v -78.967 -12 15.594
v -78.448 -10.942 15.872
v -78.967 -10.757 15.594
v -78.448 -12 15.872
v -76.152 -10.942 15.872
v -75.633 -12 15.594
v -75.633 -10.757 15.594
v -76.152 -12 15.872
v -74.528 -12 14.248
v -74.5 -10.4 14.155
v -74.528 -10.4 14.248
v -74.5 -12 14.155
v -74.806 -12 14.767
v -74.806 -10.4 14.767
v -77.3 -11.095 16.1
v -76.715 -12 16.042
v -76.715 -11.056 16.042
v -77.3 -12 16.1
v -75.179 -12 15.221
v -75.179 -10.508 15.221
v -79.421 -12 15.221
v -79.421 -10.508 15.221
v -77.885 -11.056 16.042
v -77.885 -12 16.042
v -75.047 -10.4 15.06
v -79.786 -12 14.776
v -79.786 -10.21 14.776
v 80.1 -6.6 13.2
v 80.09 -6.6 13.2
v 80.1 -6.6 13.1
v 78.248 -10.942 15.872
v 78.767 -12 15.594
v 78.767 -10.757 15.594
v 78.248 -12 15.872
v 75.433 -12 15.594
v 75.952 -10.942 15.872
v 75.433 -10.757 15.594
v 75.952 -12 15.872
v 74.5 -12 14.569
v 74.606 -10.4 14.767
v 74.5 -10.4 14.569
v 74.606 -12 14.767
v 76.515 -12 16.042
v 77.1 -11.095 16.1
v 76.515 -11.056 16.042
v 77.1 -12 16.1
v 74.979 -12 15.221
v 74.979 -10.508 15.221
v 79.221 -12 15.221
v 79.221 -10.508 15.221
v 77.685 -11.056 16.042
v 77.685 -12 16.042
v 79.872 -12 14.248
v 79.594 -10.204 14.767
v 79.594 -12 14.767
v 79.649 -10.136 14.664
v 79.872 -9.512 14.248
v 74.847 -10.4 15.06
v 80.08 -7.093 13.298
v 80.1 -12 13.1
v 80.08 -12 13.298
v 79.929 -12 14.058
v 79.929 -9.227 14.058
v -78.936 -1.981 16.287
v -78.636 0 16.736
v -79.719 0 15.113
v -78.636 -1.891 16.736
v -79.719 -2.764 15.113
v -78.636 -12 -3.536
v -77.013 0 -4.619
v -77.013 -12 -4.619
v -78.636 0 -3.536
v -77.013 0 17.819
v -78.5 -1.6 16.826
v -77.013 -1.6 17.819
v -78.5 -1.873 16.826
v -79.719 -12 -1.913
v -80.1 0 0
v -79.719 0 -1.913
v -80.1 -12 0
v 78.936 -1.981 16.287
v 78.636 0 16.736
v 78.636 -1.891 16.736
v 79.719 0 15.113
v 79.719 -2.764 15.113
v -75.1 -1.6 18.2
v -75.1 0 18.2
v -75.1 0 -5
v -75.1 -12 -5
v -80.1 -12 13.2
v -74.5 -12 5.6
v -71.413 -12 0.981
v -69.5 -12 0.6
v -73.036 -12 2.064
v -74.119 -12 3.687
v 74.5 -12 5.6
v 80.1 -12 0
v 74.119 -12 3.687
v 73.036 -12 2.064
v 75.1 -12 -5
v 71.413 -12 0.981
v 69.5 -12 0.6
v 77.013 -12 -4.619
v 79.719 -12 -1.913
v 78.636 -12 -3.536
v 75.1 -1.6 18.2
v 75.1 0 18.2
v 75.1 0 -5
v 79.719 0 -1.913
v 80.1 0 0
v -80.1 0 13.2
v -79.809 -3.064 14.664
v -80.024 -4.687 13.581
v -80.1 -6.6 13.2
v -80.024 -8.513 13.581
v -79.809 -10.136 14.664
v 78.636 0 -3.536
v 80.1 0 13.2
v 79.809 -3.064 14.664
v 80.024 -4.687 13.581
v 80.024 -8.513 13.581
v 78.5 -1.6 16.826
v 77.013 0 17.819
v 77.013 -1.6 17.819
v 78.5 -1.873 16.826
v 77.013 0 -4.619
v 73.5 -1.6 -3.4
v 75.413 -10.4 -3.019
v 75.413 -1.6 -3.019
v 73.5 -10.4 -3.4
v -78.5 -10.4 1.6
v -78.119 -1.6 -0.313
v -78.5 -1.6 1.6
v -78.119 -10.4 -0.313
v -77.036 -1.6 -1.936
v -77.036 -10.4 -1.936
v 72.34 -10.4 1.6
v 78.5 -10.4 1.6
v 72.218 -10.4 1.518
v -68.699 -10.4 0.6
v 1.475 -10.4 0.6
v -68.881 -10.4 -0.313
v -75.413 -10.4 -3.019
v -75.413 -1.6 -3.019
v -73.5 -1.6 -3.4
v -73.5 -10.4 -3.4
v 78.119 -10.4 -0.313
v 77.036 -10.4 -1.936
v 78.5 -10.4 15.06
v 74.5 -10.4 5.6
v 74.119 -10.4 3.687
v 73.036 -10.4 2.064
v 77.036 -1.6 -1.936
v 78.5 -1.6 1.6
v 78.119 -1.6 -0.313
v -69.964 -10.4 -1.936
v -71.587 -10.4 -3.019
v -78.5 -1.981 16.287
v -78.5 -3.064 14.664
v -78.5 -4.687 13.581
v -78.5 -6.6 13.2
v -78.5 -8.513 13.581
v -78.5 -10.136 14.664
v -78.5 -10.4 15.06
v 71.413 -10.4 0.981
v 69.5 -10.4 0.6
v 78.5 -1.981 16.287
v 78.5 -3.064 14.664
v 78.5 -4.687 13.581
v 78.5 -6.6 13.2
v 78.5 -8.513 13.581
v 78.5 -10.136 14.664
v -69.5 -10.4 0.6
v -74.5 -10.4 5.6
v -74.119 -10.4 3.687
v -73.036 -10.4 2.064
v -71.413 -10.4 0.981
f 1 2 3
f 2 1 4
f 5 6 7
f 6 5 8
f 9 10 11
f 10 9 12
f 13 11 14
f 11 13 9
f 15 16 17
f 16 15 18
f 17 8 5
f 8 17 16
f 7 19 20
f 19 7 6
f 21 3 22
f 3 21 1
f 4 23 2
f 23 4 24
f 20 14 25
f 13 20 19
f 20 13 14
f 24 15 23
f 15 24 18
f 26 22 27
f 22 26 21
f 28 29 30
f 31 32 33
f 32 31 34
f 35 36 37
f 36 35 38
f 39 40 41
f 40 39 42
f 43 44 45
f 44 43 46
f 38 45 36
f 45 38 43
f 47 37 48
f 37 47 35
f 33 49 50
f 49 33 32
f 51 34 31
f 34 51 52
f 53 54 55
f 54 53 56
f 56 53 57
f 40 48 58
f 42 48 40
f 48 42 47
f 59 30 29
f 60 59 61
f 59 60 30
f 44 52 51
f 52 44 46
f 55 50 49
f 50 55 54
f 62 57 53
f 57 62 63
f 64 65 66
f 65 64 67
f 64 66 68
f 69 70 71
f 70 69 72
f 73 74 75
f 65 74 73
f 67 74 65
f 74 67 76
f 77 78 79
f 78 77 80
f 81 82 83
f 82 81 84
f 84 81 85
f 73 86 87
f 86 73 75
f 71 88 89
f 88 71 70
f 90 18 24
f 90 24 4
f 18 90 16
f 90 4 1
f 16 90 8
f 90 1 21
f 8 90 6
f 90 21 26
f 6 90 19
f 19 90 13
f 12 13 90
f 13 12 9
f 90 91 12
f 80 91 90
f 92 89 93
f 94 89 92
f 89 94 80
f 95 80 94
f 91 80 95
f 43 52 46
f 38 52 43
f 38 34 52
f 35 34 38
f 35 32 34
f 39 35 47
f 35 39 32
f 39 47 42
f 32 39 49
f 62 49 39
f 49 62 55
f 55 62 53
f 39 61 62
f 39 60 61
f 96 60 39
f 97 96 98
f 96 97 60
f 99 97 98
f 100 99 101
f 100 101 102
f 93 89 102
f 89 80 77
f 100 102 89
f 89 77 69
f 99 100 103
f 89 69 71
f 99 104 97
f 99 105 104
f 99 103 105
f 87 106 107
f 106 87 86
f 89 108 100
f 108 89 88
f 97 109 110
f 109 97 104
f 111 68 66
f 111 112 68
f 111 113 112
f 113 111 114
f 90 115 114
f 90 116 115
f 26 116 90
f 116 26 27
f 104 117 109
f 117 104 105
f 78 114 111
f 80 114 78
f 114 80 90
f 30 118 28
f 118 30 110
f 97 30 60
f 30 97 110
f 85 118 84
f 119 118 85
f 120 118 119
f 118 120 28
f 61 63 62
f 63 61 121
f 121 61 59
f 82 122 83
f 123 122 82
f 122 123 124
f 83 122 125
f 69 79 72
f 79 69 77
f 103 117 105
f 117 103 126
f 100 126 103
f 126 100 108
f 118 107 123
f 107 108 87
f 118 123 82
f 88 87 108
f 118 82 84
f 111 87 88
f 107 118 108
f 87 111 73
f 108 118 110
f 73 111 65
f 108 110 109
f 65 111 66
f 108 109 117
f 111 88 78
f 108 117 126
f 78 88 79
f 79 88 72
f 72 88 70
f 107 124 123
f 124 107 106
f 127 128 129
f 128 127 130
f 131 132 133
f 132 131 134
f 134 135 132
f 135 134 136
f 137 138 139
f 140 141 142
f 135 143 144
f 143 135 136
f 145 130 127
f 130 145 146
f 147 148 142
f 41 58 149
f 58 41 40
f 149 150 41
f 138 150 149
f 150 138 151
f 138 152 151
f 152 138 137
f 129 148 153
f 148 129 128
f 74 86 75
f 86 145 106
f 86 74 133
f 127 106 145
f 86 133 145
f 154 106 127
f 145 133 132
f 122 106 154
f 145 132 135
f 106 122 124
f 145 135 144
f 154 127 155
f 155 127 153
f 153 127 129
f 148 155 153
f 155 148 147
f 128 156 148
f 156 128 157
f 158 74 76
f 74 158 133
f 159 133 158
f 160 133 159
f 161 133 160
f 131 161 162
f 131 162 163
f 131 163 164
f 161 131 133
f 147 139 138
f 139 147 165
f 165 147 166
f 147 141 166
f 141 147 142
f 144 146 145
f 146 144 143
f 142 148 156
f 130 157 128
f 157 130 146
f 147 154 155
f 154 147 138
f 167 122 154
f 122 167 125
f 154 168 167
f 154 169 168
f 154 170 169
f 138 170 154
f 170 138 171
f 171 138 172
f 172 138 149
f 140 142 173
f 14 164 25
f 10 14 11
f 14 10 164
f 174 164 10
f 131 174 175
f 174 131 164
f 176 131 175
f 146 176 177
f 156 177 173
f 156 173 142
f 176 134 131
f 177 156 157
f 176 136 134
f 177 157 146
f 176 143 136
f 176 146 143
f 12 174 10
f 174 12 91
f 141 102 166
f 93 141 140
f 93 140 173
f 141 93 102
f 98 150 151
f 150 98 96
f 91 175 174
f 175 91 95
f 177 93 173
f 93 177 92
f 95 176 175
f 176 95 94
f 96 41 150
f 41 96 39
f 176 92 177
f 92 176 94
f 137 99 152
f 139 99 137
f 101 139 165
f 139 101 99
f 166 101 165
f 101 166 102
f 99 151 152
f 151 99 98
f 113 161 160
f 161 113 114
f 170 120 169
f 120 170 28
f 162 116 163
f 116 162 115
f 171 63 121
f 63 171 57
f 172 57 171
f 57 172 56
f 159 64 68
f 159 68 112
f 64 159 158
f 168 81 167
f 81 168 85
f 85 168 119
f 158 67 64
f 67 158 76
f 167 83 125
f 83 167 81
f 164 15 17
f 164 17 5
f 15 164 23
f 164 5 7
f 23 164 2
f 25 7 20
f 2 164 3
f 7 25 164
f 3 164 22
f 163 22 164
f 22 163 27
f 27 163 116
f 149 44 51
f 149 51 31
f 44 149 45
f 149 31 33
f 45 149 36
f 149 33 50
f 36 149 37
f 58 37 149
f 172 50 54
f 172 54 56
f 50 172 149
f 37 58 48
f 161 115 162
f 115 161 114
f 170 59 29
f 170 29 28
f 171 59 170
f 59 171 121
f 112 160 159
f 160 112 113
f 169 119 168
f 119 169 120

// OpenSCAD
/* $fn = 100; */
inner_width = 7 + 150;
depth = 3 + 9;
inner_height = 20;
insert_depth = 40;
float_left = true;
rad = 5;
thickness = 1.6;
width = inner_width + (thickness * 2) - (2 * rad);
height = inner_height + (thickness * 2) - (2 * rad);
rant = 4;
over = 70;
/* bend_angle=5; */
bend_angle = 0;  // prints better

module baseblock(w = 55, h = 96, r = 5, t = 9) {
  hull() {
    cylinder(t, r = r);
    translate([w, 0, 0]) {
      translate([0, h, 0]) cylinder(t, r = r);
      cylinder(t, r = r);
      cylinder(t, r = r);
    }
    translate([0, h, 0]) cylinder(t, r = r);
  }
}

module phonecase() {
  rrant = rant;
  hrant = rant;
  difference() {
    baseblock(w = width, h = height, t = depth);
    translate([thickness, thickness, thickness])
        baseblock(w = width - (thickness * 2), h = height * 2, t = depth - (thickness * 2));
    translate([thickness + rrant, thickness + rrant, thickness])
        baseblock(w = width - ((thickness + rrant) * 2), h = height - (thickness * 2), t = depth);
    translate([width * 1.5, height + rad, rad + thickness]) rotate(-90, [0, 1, 0])
        cylinder(width * 2, r = rad);

    translate([thickness / 2, thickness + rrant, thickness]) {
      union() {
        translate([-(rad - (rant / 2)), height - (thickness * 2) - rad / 2, 0]) {
          difference() {
            translate([-(rad - (rant / 2)), 0, (height / 2) - thickness]) {
              cube([(rad - (rant / 2)) * 3, rad * 2, height / 2]);
            }
            cylinder(h = height, r = rad - (rant / 2), $fn = 32);
          }
          translate([width + (rad - thickness) + 0.8, 0, 0]) mirror([1, 0, 0]) {
            difference() {
              translate([-(rad - (rant / 2)), 0, (height / 2) - thickness]) {
                cube([(rad - (rant / 2)) * 3, rad * 2, height / 2]);
              }
              cylinder(h = height, r = rad - (rant / 2), $fn = 32);
            }
          }
        }
      }
    }
  }
}

translate([-width / 2, 0, 0]) {
  translate([0, 0, 0]) {
    rotate(90, [1, 0, 0]) {
      rotate(bend_angle, [-1, 0, 0]) phonecase();
    }
  }
}
